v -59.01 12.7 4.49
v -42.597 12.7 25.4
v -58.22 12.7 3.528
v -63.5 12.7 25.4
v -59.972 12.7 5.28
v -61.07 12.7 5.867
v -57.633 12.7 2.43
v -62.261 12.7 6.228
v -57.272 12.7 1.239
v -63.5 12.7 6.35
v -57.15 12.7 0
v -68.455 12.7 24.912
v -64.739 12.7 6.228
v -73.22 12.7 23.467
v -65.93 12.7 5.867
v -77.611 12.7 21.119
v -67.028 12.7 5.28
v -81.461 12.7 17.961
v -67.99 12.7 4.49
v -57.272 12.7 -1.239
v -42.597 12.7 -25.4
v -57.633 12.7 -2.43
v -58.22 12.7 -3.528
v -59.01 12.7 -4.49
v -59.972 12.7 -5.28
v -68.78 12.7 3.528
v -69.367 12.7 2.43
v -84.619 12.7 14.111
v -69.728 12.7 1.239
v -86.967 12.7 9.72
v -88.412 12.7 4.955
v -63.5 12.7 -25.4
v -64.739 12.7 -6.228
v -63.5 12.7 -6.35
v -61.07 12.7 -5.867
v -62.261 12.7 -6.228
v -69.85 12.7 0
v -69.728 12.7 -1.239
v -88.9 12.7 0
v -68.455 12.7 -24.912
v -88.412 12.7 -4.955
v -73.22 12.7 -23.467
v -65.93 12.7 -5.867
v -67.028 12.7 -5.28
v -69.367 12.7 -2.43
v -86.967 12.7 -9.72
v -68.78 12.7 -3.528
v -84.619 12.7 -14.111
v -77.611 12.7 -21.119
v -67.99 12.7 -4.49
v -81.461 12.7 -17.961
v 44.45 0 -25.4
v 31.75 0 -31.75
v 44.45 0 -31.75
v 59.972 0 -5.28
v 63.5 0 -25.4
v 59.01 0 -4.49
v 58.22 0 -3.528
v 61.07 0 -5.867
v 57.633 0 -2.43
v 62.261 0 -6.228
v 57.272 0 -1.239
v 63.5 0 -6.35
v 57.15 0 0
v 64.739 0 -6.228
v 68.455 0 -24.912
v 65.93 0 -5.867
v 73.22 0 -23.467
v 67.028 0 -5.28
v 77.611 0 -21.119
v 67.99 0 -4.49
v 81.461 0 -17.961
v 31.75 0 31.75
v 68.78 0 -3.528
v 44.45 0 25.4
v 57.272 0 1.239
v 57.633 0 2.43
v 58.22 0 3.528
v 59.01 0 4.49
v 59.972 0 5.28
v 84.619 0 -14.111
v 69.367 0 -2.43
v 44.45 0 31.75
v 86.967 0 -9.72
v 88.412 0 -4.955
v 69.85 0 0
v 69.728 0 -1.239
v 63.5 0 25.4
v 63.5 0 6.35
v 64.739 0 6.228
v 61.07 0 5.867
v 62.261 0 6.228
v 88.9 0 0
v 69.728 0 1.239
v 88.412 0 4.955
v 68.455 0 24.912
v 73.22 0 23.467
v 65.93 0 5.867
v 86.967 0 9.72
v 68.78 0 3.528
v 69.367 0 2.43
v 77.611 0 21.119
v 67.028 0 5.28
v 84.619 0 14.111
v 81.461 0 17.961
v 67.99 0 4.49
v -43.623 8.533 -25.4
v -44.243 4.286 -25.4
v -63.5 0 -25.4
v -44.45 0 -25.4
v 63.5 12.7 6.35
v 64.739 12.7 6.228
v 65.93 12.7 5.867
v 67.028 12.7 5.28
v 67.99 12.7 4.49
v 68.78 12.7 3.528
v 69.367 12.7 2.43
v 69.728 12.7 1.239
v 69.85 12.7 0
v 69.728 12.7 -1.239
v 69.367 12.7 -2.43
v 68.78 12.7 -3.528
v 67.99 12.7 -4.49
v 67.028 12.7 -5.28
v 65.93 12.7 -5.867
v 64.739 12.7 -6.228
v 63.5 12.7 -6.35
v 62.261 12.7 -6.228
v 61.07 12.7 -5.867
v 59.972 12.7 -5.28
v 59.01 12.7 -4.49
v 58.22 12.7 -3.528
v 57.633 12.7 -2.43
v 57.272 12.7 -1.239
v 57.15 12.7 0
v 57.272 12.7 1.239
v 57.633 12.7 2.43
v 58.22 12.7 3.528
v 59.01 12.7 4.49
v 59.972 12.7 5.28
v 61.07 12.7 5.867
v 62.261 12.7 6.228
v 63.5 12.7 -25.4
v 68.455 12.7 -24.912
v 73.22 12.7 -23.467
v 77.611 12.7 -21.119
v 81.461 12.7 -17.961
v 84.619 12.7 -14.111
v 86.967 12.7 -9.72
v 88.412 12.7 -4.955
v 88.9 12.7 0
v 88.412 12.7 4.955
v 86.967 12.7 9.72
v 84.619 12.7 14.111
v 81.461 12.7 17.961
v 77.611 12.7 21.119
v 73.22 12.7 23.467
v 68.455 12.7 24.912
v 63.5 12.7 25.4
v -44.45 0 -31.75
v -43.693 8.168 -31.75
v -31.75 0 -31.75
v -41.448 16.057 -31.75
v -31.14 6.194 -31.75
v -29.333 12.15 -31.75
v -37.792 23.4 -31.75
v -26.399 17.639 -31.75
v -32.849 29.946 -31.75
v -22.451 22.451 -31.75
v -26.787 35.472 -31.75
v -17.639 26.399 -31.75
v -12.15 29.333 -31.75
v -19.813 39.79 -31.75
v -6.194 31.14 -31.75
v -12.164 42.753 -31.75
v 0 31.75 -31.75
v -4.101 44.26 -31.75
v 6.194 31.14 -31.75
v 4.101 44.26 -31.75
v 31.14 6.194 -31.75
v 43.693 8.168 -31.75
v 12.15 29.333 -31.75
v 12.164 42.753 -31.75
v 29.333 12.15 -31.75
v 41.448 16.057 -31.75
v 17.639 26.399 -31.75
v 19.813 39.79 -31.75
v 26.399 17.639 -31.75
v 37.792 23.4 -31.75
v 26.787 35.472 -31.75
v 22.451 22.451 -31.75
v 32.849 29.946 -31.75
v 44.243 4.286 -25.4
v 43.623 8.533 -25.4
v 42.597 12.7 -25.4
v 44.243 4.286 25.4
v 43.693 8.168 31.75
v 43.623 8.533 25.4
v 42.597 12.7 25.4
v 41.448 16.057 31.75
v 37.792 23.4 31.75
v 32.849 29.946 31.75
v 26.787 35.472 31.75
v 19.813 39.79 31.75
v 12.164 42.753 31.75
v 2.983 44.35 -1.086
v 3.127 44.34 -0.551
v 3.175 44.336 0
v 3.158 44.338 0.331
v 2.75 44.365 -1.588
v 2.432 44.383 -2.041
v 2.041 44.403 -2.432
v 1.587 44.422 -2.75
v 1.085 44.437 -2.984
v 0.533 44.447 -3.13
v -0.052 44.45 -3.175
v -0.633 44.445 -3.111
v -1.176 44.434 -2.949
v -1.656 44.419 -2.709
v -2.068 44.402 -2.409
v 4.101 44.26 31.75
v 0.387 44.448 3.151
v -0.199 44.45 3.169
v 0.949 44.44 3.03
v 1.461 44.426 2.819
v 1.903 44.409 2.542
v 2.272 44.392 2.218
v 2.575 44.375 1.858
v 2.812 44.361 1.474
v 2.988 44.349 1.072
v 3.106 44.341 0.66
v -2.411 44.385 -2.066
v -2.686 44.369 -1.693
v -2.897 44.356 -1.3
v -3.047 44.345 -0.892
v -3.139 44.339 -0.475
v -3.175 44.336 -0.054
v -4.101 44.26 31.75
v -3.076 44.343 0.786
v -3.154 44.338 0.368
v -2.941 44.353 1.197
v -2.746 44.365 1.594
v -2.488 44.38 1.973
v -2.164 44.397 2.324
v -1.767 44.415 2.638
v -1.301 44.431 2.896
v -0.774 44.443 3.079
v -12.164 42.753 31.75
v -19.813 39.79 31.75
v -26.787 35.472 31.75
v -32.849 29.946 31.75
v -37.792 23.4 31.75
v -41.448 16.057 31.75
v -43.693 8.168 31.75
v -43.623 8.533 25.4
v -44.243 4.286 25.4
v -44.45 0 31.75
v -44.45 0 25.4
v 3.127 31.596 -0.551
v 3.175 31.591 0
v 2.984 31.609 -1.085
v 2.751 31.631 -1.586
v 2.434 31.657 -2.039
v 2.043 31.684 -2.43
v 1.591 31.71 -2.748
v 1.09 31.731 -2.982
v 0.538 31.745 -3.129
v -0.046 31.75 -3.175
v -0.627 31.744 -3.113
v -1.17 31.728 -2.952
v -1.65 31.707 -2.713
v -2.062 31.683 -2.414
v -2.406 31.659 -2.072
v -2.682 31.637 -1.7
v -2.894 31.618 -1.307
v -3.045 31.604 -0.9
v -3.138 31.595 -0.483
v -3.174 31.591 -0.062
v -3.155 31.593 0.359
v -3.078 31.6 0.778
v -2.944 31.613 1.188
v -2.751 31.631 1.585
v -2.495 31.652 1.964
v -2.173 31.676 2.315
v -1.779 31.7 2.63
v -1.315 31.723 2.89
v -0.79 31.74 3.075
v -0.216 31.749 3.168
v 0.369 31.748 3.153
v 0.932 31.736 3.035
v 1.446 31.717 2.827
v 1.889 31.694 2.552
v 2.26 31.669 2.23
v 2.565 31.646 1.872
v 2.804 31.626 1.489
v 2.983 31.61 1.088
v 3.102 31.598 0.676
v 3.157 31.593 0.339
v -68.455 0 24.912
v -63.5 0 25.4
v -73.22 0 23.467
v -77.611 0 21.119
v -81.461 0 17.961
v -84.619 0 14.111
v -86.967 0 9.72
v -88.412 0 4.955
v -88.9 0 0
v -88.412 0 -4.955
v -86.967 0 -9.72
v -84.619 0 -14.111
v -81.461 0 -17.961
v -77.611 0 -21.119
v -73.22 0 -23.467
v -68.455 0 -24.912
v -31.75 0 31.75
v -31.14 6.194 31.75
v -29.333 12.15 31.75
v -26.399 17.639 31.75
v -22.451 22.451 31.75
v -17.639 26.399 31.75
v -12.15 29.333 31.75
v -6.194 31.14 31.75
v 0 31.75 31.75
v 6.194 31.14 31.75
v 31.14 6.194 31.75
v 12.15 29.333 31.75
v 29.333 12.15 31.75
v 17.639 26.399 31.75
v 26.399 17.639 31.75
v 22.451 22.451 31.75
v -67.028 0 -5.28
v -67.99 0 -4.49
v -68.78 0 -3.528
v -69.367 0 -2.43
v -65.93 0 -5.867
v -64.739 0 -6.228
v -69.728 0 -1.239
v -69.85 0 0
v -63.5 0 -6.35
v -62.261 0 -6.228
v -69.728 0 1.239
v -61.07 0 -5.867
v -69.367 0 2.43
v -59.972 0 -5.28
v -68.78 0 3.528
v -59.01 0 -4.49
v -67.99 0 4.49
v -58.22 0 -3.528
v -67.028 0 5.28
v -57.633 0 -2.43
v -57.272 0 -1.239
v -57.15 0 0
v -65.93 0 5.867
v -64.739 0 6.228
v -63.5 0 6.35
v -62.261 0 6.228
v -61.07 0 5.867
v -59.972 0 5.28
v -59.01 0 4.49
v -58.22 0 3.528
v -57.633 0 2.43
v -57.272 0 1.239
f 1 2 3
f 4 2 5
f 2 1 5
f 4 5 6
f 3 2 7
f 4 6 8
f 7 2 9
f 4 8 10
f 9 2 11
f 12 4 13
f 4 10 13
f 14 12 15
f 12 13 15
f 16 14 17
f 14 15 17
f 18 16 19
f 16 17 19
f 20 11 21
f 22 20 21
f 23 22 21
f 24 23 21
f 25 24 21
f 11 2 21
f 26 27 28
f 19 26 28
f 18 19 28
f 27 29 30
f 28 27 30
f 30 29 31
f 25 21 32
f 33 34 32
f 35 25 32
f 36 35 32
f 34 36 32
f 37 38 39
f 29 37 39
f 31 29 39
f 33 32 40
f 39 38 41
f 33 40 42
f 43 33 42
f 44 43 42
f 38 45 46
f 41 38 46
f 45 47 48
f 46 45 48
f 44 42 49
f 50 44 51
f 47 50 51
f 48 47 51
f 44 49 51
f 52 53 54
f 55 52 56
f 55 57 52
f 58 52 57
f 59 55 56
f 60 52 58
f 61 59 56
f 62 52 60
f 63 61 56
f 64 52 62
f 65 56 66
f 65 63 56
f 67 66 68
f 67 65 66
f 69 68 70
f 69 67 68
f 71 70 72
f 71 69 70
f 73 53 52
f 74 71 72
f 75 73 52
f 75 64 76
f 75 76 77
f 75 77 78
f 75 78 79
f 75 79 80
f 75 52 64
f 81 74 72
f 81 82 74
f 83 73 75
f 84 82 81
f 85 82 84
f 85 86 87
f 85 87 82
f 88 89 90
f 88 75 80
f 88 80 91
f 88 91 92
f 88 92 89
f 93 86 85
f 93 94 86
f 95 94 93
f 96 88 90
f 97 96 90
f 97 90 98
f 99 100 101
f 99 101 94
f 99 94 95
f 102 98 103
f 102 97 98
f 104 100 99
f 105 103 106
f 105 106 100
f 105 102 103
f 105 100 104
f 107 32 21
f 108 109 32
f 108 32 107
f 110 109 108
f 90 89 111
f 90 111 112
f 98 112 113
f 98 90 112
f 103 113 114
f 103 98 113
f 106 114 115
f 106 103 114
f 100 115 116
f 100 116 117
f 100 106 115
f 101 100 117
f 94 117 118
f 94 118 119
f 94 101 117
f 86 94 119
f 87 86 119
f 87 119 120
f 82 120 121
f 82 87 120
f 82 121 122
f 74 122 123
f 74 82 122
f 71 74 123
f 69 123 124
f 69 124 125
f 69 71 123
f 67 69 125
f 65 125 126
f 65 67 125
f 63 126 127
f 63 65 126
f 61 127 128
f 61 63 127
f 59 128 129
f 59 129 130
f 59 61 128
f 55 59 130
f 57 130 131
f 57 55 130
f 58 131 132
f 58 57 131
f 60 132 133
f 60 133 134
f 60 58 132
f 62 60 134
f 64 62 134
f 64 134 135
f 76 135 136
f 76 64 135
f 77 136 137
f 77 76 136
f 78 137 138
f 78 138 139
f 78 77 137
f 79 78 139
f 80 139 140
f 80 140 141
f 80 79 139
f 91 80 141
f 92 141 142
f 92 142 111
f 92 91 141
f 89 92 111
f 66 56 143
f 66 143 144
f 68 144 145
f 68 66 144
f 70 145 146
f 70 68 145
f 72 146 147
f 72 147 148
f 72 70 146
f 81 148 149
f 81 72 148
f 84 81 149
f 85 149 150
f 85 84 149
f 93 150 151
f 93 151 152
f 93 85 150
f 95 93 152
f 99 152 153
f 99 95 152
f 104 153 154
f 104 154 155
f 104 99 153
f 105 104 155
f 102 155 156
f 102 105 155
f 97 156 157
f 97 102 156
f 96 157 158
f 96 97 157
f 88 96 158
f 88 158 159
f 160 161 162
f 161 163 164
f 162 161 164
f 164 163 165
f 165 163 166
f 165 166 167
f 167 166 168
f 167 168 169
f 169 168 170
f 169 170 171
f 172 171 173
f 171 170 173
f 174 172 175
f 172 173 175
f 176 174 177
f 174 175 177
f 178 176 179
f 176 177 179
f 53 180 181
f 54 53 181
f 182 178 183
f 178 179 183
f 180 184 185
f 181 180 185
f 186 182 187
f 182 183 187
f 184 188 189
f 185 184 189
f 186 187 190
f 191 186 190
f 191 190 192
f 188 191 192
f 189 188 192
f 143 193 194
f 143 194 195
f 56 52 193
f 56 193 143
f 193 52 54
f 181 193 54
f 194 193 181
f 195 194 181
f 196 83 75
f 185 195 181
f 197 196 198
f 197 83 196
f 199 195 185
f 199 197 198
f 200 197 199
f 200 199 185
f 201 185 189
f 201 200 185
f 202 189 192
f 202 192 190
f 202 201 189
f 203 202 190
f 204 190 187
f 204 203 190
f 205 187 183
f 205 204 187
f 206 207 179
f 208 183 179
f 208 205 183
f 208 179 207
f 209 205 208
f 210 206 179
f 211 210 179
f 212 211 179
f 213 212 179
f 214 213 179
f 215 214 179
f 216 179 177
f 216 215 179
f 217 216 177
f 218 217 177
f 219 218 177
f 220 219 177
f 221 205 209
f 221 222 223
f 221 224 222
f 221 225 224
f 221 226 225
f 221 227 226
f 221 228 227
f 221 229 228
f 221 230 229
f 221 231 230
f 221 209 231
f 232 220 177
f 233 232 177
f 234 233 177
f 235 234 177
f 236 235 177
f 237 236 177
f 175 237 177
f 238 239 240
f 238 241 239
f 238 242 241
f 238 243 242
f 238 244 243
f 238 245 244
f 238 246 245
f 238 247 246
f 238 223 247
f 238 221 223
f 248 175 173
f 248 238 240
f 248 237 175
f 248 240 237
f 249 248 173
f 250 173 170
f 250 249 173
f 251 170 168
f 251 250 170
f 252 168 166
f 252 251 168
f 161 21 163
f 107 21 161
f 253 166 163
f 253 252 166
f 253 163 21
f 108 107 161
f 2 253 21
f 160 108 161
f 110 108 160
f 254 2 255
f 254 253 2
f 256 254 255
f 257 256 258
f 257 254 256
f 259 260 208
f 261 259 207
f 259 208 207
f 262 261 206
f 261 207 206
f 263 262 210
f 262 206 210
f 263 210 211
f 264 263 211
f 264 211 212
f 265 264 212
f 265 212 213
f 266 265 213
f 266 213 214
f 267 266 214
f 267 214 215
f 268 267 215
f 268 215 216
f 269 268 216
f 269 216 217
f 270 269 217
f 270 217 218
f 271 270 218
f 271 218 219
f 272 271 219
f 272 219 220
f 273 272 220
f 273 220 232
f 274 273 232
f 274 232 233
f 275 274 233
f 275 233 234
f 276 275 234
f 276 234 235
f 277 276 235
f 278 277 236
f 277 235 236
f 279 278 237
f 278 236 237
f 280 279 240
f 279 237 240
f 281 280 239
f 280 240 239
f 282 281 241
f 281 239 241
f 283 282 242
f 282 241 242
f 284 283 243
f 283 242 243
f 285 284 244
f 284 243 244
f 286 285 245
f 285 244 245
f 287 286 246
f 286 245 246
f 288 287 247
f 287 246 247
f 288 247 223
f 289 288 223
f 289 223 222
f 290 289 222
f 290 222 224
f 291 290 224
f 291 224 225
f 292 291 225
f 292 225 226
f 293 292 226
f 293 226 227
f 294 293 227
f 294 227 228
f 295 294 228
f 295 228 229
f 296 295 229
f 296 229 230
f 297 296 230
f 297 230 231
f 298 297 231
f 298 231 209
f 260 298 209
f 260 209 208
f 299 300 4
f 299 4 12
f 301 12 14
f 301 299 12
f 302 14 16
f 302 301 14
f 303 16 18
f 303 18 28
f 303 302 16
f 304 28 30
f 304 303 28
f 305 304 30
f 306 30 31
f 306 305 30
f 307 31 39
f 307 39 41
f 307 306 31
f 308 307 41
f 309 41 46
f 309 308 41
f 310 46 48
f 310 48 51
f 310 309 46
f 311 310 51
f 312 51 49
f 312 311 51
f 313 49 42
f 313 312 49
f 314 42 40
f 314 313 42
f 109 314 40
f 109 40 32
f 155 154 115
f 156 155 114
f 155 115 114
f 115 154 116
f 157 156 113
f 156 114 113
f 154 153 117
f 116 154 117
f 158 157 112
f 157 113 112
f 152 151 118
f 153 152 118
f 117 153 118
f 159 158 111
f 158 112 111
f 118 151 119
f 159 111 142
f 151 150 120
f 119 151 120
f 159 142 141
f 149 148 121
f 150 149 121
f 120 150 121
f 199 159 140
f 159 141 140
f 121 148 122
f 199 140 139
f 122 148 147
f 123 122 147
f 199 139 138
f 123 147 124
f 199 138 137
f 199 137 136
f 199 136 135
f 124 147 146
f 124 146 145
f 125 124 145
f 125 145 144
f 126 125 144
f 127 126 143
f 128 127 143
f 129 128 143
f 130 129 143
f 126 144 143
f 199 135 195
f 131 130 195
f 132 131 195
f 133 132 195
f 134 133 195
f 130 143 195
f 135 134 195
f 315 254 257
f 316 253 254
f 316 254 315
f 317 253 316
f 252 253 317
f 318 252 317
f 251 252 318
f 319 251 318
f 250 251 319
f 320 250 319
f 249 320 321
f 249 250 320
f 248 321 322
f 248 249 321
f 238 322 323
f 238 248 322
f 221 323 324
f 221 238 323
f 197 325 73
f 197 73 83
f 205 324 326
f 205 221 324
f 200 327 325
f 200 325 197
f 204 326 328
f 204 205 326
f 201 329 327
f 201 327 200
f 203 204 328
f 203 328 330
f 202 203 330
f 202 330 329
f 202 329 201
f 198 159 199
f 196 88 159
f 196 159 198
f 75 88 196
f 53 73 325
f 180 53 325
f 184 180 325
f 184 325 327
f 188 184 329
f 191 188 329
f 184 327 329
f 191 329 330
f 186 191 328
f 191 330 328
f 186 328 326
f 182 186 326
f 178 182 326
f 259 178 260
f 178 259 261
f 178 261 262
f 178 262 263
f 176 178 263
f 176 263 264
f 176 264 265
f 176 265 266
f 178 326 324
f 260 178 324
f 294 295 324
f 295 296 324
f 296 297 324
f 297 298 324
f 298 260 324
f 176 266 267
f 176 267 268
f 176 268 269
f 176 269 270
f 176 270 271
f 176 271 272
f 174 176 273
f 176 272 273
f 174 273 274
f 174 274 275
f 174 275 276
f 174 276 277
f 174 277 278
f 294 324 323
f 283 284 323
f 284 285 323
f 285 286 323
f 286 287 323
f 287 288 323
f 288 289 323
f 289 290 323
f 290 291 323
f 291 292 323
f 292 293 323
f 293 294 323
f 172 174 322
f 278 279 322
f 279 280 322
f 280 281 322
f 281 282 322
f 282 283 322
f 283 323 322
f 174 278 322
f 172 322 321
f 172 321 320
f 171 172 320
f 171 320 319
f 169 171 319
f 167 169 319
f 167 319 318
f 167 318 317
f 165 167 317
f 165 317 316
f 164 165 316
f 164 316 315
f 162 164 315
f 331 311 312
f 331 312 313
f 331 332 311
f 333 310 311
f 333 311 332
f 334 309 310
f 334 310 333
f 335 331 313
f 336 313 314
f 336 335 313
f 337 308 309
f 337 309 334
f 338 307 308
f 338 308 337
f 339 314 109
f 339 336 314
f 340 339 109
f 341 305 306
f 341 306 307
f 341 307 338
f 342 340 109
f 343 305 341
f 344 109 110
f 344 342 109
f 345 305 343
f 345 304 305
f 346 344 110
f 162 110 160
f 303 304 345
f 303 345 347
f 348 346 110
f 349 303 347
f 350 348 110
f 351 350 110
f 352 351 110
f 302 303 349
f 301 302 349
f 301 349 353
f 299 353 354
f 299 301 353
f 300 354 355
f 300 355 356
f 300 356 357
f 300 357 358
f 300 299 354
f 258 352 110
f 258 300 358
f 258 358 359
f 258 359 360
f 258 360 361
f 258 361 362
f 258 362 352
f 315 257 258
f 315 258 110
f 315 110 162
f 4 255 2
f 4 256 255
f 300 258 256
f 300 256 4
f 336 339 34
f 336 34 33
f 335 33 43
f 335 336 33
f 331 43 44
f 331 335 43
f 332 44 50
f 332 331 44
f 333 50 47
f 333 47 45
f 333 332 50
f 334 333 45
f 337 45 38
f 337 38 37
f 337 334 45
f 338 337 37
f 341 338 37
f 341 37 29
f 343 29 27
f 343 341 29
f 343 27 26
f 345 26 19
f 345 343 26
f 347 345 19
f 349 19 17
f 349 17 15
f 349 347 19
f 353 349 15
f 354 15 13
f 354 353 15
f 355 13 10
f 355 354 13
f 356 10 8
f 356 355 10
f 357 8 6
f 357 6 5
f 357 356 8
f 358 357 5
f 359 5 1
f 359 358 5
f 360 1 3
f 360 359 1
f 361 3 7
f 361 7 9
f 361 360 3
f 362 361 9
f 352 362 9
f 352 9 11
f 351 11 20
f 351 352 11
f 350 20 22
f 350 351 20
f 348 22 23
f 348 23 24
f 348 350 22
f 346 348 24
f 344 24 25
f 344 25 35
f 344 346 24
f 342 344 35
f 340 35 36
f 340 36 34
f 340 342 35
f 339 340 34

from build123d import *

# Parameters (mm, degrees)
SLOTSKETCH_R      = 6.35
SLOTEXTRUDE_DEPTH = 12.7
ARCEXTRUDE_DEPTH  = 31.75
CENTERDRILL_D     = 6.35
ARCPROFILE_DEPTH  = 64.5000001


with BuildPart() as part:
    # slotSketch → slotExtrude (new body)
    with BuildSketch(Plane(origin=(0, 0, 0), x_dir=(1, 0, 0), z_dir=(0, 1, 0))):
        with BuildLine():
            Line((-63.5, 25.4), (63.5, 25.4))
            ThreePointArc((63.5, 25.4), (88.9, 0), (63.5, -25.4))
            Line((63.5, -25.4), (-63.5, -25.4))
            ThreePointArc((-63.5, -25.4), (-88.9, 0), (-63.5, 25.4))
        make_face()
        with Locations(Location((63.5, 0, 0), (0, 0, 270))):  # turned: the seam where the file's is
            Circle(SLOTSKETCH_R, mode=Mode.SUBTRACT)
        with Locations(Location((-63.5, 0, 0), (0, 0, 90))):  # turned: the seam where the file's is
            Circle(SLOTSKETCH_R, mode=Mode.SUBTRACT)
    extrude(amount=SLOTEXTRUDE_DEPTH)

    # Sketch3 → arcExtrude (add, symmetric)
    with BuildSketch(Plane.XY):
        with BuildLine():
            Line((-44.45, 0), (44.45, 0))
            ThreePointArc((44.45, 0), (0, 44.45), (-44.45, 0))
        make_face()
    extrude(amount=ARCEXTRUDE_DEPTH, both=True)

    # centerDrill (through all)
    with Locations(Plane(origin=(0, 0, 0), x_dir=(-1, 0, 0), z_dir=(0, -1, 0))):
        with Locations((0, 0)):
            Hole(CENTERDRILL_D / 2)

    # Sketch7 → arcProfile (cut, through all)
    with BuildSketch(Plane.XY.offset(31.75)):
        with BuildLine():
            Line((-31.75, 0), (31.75, 0))
            ThreePointArc((31.75, 0), (0, 31.75), (-31.75, 0))
        make_face()
    extrude(amount=-ARCPROFILE_DEPTH, mode=Mode.SUBTRACT)


solid = part.part
